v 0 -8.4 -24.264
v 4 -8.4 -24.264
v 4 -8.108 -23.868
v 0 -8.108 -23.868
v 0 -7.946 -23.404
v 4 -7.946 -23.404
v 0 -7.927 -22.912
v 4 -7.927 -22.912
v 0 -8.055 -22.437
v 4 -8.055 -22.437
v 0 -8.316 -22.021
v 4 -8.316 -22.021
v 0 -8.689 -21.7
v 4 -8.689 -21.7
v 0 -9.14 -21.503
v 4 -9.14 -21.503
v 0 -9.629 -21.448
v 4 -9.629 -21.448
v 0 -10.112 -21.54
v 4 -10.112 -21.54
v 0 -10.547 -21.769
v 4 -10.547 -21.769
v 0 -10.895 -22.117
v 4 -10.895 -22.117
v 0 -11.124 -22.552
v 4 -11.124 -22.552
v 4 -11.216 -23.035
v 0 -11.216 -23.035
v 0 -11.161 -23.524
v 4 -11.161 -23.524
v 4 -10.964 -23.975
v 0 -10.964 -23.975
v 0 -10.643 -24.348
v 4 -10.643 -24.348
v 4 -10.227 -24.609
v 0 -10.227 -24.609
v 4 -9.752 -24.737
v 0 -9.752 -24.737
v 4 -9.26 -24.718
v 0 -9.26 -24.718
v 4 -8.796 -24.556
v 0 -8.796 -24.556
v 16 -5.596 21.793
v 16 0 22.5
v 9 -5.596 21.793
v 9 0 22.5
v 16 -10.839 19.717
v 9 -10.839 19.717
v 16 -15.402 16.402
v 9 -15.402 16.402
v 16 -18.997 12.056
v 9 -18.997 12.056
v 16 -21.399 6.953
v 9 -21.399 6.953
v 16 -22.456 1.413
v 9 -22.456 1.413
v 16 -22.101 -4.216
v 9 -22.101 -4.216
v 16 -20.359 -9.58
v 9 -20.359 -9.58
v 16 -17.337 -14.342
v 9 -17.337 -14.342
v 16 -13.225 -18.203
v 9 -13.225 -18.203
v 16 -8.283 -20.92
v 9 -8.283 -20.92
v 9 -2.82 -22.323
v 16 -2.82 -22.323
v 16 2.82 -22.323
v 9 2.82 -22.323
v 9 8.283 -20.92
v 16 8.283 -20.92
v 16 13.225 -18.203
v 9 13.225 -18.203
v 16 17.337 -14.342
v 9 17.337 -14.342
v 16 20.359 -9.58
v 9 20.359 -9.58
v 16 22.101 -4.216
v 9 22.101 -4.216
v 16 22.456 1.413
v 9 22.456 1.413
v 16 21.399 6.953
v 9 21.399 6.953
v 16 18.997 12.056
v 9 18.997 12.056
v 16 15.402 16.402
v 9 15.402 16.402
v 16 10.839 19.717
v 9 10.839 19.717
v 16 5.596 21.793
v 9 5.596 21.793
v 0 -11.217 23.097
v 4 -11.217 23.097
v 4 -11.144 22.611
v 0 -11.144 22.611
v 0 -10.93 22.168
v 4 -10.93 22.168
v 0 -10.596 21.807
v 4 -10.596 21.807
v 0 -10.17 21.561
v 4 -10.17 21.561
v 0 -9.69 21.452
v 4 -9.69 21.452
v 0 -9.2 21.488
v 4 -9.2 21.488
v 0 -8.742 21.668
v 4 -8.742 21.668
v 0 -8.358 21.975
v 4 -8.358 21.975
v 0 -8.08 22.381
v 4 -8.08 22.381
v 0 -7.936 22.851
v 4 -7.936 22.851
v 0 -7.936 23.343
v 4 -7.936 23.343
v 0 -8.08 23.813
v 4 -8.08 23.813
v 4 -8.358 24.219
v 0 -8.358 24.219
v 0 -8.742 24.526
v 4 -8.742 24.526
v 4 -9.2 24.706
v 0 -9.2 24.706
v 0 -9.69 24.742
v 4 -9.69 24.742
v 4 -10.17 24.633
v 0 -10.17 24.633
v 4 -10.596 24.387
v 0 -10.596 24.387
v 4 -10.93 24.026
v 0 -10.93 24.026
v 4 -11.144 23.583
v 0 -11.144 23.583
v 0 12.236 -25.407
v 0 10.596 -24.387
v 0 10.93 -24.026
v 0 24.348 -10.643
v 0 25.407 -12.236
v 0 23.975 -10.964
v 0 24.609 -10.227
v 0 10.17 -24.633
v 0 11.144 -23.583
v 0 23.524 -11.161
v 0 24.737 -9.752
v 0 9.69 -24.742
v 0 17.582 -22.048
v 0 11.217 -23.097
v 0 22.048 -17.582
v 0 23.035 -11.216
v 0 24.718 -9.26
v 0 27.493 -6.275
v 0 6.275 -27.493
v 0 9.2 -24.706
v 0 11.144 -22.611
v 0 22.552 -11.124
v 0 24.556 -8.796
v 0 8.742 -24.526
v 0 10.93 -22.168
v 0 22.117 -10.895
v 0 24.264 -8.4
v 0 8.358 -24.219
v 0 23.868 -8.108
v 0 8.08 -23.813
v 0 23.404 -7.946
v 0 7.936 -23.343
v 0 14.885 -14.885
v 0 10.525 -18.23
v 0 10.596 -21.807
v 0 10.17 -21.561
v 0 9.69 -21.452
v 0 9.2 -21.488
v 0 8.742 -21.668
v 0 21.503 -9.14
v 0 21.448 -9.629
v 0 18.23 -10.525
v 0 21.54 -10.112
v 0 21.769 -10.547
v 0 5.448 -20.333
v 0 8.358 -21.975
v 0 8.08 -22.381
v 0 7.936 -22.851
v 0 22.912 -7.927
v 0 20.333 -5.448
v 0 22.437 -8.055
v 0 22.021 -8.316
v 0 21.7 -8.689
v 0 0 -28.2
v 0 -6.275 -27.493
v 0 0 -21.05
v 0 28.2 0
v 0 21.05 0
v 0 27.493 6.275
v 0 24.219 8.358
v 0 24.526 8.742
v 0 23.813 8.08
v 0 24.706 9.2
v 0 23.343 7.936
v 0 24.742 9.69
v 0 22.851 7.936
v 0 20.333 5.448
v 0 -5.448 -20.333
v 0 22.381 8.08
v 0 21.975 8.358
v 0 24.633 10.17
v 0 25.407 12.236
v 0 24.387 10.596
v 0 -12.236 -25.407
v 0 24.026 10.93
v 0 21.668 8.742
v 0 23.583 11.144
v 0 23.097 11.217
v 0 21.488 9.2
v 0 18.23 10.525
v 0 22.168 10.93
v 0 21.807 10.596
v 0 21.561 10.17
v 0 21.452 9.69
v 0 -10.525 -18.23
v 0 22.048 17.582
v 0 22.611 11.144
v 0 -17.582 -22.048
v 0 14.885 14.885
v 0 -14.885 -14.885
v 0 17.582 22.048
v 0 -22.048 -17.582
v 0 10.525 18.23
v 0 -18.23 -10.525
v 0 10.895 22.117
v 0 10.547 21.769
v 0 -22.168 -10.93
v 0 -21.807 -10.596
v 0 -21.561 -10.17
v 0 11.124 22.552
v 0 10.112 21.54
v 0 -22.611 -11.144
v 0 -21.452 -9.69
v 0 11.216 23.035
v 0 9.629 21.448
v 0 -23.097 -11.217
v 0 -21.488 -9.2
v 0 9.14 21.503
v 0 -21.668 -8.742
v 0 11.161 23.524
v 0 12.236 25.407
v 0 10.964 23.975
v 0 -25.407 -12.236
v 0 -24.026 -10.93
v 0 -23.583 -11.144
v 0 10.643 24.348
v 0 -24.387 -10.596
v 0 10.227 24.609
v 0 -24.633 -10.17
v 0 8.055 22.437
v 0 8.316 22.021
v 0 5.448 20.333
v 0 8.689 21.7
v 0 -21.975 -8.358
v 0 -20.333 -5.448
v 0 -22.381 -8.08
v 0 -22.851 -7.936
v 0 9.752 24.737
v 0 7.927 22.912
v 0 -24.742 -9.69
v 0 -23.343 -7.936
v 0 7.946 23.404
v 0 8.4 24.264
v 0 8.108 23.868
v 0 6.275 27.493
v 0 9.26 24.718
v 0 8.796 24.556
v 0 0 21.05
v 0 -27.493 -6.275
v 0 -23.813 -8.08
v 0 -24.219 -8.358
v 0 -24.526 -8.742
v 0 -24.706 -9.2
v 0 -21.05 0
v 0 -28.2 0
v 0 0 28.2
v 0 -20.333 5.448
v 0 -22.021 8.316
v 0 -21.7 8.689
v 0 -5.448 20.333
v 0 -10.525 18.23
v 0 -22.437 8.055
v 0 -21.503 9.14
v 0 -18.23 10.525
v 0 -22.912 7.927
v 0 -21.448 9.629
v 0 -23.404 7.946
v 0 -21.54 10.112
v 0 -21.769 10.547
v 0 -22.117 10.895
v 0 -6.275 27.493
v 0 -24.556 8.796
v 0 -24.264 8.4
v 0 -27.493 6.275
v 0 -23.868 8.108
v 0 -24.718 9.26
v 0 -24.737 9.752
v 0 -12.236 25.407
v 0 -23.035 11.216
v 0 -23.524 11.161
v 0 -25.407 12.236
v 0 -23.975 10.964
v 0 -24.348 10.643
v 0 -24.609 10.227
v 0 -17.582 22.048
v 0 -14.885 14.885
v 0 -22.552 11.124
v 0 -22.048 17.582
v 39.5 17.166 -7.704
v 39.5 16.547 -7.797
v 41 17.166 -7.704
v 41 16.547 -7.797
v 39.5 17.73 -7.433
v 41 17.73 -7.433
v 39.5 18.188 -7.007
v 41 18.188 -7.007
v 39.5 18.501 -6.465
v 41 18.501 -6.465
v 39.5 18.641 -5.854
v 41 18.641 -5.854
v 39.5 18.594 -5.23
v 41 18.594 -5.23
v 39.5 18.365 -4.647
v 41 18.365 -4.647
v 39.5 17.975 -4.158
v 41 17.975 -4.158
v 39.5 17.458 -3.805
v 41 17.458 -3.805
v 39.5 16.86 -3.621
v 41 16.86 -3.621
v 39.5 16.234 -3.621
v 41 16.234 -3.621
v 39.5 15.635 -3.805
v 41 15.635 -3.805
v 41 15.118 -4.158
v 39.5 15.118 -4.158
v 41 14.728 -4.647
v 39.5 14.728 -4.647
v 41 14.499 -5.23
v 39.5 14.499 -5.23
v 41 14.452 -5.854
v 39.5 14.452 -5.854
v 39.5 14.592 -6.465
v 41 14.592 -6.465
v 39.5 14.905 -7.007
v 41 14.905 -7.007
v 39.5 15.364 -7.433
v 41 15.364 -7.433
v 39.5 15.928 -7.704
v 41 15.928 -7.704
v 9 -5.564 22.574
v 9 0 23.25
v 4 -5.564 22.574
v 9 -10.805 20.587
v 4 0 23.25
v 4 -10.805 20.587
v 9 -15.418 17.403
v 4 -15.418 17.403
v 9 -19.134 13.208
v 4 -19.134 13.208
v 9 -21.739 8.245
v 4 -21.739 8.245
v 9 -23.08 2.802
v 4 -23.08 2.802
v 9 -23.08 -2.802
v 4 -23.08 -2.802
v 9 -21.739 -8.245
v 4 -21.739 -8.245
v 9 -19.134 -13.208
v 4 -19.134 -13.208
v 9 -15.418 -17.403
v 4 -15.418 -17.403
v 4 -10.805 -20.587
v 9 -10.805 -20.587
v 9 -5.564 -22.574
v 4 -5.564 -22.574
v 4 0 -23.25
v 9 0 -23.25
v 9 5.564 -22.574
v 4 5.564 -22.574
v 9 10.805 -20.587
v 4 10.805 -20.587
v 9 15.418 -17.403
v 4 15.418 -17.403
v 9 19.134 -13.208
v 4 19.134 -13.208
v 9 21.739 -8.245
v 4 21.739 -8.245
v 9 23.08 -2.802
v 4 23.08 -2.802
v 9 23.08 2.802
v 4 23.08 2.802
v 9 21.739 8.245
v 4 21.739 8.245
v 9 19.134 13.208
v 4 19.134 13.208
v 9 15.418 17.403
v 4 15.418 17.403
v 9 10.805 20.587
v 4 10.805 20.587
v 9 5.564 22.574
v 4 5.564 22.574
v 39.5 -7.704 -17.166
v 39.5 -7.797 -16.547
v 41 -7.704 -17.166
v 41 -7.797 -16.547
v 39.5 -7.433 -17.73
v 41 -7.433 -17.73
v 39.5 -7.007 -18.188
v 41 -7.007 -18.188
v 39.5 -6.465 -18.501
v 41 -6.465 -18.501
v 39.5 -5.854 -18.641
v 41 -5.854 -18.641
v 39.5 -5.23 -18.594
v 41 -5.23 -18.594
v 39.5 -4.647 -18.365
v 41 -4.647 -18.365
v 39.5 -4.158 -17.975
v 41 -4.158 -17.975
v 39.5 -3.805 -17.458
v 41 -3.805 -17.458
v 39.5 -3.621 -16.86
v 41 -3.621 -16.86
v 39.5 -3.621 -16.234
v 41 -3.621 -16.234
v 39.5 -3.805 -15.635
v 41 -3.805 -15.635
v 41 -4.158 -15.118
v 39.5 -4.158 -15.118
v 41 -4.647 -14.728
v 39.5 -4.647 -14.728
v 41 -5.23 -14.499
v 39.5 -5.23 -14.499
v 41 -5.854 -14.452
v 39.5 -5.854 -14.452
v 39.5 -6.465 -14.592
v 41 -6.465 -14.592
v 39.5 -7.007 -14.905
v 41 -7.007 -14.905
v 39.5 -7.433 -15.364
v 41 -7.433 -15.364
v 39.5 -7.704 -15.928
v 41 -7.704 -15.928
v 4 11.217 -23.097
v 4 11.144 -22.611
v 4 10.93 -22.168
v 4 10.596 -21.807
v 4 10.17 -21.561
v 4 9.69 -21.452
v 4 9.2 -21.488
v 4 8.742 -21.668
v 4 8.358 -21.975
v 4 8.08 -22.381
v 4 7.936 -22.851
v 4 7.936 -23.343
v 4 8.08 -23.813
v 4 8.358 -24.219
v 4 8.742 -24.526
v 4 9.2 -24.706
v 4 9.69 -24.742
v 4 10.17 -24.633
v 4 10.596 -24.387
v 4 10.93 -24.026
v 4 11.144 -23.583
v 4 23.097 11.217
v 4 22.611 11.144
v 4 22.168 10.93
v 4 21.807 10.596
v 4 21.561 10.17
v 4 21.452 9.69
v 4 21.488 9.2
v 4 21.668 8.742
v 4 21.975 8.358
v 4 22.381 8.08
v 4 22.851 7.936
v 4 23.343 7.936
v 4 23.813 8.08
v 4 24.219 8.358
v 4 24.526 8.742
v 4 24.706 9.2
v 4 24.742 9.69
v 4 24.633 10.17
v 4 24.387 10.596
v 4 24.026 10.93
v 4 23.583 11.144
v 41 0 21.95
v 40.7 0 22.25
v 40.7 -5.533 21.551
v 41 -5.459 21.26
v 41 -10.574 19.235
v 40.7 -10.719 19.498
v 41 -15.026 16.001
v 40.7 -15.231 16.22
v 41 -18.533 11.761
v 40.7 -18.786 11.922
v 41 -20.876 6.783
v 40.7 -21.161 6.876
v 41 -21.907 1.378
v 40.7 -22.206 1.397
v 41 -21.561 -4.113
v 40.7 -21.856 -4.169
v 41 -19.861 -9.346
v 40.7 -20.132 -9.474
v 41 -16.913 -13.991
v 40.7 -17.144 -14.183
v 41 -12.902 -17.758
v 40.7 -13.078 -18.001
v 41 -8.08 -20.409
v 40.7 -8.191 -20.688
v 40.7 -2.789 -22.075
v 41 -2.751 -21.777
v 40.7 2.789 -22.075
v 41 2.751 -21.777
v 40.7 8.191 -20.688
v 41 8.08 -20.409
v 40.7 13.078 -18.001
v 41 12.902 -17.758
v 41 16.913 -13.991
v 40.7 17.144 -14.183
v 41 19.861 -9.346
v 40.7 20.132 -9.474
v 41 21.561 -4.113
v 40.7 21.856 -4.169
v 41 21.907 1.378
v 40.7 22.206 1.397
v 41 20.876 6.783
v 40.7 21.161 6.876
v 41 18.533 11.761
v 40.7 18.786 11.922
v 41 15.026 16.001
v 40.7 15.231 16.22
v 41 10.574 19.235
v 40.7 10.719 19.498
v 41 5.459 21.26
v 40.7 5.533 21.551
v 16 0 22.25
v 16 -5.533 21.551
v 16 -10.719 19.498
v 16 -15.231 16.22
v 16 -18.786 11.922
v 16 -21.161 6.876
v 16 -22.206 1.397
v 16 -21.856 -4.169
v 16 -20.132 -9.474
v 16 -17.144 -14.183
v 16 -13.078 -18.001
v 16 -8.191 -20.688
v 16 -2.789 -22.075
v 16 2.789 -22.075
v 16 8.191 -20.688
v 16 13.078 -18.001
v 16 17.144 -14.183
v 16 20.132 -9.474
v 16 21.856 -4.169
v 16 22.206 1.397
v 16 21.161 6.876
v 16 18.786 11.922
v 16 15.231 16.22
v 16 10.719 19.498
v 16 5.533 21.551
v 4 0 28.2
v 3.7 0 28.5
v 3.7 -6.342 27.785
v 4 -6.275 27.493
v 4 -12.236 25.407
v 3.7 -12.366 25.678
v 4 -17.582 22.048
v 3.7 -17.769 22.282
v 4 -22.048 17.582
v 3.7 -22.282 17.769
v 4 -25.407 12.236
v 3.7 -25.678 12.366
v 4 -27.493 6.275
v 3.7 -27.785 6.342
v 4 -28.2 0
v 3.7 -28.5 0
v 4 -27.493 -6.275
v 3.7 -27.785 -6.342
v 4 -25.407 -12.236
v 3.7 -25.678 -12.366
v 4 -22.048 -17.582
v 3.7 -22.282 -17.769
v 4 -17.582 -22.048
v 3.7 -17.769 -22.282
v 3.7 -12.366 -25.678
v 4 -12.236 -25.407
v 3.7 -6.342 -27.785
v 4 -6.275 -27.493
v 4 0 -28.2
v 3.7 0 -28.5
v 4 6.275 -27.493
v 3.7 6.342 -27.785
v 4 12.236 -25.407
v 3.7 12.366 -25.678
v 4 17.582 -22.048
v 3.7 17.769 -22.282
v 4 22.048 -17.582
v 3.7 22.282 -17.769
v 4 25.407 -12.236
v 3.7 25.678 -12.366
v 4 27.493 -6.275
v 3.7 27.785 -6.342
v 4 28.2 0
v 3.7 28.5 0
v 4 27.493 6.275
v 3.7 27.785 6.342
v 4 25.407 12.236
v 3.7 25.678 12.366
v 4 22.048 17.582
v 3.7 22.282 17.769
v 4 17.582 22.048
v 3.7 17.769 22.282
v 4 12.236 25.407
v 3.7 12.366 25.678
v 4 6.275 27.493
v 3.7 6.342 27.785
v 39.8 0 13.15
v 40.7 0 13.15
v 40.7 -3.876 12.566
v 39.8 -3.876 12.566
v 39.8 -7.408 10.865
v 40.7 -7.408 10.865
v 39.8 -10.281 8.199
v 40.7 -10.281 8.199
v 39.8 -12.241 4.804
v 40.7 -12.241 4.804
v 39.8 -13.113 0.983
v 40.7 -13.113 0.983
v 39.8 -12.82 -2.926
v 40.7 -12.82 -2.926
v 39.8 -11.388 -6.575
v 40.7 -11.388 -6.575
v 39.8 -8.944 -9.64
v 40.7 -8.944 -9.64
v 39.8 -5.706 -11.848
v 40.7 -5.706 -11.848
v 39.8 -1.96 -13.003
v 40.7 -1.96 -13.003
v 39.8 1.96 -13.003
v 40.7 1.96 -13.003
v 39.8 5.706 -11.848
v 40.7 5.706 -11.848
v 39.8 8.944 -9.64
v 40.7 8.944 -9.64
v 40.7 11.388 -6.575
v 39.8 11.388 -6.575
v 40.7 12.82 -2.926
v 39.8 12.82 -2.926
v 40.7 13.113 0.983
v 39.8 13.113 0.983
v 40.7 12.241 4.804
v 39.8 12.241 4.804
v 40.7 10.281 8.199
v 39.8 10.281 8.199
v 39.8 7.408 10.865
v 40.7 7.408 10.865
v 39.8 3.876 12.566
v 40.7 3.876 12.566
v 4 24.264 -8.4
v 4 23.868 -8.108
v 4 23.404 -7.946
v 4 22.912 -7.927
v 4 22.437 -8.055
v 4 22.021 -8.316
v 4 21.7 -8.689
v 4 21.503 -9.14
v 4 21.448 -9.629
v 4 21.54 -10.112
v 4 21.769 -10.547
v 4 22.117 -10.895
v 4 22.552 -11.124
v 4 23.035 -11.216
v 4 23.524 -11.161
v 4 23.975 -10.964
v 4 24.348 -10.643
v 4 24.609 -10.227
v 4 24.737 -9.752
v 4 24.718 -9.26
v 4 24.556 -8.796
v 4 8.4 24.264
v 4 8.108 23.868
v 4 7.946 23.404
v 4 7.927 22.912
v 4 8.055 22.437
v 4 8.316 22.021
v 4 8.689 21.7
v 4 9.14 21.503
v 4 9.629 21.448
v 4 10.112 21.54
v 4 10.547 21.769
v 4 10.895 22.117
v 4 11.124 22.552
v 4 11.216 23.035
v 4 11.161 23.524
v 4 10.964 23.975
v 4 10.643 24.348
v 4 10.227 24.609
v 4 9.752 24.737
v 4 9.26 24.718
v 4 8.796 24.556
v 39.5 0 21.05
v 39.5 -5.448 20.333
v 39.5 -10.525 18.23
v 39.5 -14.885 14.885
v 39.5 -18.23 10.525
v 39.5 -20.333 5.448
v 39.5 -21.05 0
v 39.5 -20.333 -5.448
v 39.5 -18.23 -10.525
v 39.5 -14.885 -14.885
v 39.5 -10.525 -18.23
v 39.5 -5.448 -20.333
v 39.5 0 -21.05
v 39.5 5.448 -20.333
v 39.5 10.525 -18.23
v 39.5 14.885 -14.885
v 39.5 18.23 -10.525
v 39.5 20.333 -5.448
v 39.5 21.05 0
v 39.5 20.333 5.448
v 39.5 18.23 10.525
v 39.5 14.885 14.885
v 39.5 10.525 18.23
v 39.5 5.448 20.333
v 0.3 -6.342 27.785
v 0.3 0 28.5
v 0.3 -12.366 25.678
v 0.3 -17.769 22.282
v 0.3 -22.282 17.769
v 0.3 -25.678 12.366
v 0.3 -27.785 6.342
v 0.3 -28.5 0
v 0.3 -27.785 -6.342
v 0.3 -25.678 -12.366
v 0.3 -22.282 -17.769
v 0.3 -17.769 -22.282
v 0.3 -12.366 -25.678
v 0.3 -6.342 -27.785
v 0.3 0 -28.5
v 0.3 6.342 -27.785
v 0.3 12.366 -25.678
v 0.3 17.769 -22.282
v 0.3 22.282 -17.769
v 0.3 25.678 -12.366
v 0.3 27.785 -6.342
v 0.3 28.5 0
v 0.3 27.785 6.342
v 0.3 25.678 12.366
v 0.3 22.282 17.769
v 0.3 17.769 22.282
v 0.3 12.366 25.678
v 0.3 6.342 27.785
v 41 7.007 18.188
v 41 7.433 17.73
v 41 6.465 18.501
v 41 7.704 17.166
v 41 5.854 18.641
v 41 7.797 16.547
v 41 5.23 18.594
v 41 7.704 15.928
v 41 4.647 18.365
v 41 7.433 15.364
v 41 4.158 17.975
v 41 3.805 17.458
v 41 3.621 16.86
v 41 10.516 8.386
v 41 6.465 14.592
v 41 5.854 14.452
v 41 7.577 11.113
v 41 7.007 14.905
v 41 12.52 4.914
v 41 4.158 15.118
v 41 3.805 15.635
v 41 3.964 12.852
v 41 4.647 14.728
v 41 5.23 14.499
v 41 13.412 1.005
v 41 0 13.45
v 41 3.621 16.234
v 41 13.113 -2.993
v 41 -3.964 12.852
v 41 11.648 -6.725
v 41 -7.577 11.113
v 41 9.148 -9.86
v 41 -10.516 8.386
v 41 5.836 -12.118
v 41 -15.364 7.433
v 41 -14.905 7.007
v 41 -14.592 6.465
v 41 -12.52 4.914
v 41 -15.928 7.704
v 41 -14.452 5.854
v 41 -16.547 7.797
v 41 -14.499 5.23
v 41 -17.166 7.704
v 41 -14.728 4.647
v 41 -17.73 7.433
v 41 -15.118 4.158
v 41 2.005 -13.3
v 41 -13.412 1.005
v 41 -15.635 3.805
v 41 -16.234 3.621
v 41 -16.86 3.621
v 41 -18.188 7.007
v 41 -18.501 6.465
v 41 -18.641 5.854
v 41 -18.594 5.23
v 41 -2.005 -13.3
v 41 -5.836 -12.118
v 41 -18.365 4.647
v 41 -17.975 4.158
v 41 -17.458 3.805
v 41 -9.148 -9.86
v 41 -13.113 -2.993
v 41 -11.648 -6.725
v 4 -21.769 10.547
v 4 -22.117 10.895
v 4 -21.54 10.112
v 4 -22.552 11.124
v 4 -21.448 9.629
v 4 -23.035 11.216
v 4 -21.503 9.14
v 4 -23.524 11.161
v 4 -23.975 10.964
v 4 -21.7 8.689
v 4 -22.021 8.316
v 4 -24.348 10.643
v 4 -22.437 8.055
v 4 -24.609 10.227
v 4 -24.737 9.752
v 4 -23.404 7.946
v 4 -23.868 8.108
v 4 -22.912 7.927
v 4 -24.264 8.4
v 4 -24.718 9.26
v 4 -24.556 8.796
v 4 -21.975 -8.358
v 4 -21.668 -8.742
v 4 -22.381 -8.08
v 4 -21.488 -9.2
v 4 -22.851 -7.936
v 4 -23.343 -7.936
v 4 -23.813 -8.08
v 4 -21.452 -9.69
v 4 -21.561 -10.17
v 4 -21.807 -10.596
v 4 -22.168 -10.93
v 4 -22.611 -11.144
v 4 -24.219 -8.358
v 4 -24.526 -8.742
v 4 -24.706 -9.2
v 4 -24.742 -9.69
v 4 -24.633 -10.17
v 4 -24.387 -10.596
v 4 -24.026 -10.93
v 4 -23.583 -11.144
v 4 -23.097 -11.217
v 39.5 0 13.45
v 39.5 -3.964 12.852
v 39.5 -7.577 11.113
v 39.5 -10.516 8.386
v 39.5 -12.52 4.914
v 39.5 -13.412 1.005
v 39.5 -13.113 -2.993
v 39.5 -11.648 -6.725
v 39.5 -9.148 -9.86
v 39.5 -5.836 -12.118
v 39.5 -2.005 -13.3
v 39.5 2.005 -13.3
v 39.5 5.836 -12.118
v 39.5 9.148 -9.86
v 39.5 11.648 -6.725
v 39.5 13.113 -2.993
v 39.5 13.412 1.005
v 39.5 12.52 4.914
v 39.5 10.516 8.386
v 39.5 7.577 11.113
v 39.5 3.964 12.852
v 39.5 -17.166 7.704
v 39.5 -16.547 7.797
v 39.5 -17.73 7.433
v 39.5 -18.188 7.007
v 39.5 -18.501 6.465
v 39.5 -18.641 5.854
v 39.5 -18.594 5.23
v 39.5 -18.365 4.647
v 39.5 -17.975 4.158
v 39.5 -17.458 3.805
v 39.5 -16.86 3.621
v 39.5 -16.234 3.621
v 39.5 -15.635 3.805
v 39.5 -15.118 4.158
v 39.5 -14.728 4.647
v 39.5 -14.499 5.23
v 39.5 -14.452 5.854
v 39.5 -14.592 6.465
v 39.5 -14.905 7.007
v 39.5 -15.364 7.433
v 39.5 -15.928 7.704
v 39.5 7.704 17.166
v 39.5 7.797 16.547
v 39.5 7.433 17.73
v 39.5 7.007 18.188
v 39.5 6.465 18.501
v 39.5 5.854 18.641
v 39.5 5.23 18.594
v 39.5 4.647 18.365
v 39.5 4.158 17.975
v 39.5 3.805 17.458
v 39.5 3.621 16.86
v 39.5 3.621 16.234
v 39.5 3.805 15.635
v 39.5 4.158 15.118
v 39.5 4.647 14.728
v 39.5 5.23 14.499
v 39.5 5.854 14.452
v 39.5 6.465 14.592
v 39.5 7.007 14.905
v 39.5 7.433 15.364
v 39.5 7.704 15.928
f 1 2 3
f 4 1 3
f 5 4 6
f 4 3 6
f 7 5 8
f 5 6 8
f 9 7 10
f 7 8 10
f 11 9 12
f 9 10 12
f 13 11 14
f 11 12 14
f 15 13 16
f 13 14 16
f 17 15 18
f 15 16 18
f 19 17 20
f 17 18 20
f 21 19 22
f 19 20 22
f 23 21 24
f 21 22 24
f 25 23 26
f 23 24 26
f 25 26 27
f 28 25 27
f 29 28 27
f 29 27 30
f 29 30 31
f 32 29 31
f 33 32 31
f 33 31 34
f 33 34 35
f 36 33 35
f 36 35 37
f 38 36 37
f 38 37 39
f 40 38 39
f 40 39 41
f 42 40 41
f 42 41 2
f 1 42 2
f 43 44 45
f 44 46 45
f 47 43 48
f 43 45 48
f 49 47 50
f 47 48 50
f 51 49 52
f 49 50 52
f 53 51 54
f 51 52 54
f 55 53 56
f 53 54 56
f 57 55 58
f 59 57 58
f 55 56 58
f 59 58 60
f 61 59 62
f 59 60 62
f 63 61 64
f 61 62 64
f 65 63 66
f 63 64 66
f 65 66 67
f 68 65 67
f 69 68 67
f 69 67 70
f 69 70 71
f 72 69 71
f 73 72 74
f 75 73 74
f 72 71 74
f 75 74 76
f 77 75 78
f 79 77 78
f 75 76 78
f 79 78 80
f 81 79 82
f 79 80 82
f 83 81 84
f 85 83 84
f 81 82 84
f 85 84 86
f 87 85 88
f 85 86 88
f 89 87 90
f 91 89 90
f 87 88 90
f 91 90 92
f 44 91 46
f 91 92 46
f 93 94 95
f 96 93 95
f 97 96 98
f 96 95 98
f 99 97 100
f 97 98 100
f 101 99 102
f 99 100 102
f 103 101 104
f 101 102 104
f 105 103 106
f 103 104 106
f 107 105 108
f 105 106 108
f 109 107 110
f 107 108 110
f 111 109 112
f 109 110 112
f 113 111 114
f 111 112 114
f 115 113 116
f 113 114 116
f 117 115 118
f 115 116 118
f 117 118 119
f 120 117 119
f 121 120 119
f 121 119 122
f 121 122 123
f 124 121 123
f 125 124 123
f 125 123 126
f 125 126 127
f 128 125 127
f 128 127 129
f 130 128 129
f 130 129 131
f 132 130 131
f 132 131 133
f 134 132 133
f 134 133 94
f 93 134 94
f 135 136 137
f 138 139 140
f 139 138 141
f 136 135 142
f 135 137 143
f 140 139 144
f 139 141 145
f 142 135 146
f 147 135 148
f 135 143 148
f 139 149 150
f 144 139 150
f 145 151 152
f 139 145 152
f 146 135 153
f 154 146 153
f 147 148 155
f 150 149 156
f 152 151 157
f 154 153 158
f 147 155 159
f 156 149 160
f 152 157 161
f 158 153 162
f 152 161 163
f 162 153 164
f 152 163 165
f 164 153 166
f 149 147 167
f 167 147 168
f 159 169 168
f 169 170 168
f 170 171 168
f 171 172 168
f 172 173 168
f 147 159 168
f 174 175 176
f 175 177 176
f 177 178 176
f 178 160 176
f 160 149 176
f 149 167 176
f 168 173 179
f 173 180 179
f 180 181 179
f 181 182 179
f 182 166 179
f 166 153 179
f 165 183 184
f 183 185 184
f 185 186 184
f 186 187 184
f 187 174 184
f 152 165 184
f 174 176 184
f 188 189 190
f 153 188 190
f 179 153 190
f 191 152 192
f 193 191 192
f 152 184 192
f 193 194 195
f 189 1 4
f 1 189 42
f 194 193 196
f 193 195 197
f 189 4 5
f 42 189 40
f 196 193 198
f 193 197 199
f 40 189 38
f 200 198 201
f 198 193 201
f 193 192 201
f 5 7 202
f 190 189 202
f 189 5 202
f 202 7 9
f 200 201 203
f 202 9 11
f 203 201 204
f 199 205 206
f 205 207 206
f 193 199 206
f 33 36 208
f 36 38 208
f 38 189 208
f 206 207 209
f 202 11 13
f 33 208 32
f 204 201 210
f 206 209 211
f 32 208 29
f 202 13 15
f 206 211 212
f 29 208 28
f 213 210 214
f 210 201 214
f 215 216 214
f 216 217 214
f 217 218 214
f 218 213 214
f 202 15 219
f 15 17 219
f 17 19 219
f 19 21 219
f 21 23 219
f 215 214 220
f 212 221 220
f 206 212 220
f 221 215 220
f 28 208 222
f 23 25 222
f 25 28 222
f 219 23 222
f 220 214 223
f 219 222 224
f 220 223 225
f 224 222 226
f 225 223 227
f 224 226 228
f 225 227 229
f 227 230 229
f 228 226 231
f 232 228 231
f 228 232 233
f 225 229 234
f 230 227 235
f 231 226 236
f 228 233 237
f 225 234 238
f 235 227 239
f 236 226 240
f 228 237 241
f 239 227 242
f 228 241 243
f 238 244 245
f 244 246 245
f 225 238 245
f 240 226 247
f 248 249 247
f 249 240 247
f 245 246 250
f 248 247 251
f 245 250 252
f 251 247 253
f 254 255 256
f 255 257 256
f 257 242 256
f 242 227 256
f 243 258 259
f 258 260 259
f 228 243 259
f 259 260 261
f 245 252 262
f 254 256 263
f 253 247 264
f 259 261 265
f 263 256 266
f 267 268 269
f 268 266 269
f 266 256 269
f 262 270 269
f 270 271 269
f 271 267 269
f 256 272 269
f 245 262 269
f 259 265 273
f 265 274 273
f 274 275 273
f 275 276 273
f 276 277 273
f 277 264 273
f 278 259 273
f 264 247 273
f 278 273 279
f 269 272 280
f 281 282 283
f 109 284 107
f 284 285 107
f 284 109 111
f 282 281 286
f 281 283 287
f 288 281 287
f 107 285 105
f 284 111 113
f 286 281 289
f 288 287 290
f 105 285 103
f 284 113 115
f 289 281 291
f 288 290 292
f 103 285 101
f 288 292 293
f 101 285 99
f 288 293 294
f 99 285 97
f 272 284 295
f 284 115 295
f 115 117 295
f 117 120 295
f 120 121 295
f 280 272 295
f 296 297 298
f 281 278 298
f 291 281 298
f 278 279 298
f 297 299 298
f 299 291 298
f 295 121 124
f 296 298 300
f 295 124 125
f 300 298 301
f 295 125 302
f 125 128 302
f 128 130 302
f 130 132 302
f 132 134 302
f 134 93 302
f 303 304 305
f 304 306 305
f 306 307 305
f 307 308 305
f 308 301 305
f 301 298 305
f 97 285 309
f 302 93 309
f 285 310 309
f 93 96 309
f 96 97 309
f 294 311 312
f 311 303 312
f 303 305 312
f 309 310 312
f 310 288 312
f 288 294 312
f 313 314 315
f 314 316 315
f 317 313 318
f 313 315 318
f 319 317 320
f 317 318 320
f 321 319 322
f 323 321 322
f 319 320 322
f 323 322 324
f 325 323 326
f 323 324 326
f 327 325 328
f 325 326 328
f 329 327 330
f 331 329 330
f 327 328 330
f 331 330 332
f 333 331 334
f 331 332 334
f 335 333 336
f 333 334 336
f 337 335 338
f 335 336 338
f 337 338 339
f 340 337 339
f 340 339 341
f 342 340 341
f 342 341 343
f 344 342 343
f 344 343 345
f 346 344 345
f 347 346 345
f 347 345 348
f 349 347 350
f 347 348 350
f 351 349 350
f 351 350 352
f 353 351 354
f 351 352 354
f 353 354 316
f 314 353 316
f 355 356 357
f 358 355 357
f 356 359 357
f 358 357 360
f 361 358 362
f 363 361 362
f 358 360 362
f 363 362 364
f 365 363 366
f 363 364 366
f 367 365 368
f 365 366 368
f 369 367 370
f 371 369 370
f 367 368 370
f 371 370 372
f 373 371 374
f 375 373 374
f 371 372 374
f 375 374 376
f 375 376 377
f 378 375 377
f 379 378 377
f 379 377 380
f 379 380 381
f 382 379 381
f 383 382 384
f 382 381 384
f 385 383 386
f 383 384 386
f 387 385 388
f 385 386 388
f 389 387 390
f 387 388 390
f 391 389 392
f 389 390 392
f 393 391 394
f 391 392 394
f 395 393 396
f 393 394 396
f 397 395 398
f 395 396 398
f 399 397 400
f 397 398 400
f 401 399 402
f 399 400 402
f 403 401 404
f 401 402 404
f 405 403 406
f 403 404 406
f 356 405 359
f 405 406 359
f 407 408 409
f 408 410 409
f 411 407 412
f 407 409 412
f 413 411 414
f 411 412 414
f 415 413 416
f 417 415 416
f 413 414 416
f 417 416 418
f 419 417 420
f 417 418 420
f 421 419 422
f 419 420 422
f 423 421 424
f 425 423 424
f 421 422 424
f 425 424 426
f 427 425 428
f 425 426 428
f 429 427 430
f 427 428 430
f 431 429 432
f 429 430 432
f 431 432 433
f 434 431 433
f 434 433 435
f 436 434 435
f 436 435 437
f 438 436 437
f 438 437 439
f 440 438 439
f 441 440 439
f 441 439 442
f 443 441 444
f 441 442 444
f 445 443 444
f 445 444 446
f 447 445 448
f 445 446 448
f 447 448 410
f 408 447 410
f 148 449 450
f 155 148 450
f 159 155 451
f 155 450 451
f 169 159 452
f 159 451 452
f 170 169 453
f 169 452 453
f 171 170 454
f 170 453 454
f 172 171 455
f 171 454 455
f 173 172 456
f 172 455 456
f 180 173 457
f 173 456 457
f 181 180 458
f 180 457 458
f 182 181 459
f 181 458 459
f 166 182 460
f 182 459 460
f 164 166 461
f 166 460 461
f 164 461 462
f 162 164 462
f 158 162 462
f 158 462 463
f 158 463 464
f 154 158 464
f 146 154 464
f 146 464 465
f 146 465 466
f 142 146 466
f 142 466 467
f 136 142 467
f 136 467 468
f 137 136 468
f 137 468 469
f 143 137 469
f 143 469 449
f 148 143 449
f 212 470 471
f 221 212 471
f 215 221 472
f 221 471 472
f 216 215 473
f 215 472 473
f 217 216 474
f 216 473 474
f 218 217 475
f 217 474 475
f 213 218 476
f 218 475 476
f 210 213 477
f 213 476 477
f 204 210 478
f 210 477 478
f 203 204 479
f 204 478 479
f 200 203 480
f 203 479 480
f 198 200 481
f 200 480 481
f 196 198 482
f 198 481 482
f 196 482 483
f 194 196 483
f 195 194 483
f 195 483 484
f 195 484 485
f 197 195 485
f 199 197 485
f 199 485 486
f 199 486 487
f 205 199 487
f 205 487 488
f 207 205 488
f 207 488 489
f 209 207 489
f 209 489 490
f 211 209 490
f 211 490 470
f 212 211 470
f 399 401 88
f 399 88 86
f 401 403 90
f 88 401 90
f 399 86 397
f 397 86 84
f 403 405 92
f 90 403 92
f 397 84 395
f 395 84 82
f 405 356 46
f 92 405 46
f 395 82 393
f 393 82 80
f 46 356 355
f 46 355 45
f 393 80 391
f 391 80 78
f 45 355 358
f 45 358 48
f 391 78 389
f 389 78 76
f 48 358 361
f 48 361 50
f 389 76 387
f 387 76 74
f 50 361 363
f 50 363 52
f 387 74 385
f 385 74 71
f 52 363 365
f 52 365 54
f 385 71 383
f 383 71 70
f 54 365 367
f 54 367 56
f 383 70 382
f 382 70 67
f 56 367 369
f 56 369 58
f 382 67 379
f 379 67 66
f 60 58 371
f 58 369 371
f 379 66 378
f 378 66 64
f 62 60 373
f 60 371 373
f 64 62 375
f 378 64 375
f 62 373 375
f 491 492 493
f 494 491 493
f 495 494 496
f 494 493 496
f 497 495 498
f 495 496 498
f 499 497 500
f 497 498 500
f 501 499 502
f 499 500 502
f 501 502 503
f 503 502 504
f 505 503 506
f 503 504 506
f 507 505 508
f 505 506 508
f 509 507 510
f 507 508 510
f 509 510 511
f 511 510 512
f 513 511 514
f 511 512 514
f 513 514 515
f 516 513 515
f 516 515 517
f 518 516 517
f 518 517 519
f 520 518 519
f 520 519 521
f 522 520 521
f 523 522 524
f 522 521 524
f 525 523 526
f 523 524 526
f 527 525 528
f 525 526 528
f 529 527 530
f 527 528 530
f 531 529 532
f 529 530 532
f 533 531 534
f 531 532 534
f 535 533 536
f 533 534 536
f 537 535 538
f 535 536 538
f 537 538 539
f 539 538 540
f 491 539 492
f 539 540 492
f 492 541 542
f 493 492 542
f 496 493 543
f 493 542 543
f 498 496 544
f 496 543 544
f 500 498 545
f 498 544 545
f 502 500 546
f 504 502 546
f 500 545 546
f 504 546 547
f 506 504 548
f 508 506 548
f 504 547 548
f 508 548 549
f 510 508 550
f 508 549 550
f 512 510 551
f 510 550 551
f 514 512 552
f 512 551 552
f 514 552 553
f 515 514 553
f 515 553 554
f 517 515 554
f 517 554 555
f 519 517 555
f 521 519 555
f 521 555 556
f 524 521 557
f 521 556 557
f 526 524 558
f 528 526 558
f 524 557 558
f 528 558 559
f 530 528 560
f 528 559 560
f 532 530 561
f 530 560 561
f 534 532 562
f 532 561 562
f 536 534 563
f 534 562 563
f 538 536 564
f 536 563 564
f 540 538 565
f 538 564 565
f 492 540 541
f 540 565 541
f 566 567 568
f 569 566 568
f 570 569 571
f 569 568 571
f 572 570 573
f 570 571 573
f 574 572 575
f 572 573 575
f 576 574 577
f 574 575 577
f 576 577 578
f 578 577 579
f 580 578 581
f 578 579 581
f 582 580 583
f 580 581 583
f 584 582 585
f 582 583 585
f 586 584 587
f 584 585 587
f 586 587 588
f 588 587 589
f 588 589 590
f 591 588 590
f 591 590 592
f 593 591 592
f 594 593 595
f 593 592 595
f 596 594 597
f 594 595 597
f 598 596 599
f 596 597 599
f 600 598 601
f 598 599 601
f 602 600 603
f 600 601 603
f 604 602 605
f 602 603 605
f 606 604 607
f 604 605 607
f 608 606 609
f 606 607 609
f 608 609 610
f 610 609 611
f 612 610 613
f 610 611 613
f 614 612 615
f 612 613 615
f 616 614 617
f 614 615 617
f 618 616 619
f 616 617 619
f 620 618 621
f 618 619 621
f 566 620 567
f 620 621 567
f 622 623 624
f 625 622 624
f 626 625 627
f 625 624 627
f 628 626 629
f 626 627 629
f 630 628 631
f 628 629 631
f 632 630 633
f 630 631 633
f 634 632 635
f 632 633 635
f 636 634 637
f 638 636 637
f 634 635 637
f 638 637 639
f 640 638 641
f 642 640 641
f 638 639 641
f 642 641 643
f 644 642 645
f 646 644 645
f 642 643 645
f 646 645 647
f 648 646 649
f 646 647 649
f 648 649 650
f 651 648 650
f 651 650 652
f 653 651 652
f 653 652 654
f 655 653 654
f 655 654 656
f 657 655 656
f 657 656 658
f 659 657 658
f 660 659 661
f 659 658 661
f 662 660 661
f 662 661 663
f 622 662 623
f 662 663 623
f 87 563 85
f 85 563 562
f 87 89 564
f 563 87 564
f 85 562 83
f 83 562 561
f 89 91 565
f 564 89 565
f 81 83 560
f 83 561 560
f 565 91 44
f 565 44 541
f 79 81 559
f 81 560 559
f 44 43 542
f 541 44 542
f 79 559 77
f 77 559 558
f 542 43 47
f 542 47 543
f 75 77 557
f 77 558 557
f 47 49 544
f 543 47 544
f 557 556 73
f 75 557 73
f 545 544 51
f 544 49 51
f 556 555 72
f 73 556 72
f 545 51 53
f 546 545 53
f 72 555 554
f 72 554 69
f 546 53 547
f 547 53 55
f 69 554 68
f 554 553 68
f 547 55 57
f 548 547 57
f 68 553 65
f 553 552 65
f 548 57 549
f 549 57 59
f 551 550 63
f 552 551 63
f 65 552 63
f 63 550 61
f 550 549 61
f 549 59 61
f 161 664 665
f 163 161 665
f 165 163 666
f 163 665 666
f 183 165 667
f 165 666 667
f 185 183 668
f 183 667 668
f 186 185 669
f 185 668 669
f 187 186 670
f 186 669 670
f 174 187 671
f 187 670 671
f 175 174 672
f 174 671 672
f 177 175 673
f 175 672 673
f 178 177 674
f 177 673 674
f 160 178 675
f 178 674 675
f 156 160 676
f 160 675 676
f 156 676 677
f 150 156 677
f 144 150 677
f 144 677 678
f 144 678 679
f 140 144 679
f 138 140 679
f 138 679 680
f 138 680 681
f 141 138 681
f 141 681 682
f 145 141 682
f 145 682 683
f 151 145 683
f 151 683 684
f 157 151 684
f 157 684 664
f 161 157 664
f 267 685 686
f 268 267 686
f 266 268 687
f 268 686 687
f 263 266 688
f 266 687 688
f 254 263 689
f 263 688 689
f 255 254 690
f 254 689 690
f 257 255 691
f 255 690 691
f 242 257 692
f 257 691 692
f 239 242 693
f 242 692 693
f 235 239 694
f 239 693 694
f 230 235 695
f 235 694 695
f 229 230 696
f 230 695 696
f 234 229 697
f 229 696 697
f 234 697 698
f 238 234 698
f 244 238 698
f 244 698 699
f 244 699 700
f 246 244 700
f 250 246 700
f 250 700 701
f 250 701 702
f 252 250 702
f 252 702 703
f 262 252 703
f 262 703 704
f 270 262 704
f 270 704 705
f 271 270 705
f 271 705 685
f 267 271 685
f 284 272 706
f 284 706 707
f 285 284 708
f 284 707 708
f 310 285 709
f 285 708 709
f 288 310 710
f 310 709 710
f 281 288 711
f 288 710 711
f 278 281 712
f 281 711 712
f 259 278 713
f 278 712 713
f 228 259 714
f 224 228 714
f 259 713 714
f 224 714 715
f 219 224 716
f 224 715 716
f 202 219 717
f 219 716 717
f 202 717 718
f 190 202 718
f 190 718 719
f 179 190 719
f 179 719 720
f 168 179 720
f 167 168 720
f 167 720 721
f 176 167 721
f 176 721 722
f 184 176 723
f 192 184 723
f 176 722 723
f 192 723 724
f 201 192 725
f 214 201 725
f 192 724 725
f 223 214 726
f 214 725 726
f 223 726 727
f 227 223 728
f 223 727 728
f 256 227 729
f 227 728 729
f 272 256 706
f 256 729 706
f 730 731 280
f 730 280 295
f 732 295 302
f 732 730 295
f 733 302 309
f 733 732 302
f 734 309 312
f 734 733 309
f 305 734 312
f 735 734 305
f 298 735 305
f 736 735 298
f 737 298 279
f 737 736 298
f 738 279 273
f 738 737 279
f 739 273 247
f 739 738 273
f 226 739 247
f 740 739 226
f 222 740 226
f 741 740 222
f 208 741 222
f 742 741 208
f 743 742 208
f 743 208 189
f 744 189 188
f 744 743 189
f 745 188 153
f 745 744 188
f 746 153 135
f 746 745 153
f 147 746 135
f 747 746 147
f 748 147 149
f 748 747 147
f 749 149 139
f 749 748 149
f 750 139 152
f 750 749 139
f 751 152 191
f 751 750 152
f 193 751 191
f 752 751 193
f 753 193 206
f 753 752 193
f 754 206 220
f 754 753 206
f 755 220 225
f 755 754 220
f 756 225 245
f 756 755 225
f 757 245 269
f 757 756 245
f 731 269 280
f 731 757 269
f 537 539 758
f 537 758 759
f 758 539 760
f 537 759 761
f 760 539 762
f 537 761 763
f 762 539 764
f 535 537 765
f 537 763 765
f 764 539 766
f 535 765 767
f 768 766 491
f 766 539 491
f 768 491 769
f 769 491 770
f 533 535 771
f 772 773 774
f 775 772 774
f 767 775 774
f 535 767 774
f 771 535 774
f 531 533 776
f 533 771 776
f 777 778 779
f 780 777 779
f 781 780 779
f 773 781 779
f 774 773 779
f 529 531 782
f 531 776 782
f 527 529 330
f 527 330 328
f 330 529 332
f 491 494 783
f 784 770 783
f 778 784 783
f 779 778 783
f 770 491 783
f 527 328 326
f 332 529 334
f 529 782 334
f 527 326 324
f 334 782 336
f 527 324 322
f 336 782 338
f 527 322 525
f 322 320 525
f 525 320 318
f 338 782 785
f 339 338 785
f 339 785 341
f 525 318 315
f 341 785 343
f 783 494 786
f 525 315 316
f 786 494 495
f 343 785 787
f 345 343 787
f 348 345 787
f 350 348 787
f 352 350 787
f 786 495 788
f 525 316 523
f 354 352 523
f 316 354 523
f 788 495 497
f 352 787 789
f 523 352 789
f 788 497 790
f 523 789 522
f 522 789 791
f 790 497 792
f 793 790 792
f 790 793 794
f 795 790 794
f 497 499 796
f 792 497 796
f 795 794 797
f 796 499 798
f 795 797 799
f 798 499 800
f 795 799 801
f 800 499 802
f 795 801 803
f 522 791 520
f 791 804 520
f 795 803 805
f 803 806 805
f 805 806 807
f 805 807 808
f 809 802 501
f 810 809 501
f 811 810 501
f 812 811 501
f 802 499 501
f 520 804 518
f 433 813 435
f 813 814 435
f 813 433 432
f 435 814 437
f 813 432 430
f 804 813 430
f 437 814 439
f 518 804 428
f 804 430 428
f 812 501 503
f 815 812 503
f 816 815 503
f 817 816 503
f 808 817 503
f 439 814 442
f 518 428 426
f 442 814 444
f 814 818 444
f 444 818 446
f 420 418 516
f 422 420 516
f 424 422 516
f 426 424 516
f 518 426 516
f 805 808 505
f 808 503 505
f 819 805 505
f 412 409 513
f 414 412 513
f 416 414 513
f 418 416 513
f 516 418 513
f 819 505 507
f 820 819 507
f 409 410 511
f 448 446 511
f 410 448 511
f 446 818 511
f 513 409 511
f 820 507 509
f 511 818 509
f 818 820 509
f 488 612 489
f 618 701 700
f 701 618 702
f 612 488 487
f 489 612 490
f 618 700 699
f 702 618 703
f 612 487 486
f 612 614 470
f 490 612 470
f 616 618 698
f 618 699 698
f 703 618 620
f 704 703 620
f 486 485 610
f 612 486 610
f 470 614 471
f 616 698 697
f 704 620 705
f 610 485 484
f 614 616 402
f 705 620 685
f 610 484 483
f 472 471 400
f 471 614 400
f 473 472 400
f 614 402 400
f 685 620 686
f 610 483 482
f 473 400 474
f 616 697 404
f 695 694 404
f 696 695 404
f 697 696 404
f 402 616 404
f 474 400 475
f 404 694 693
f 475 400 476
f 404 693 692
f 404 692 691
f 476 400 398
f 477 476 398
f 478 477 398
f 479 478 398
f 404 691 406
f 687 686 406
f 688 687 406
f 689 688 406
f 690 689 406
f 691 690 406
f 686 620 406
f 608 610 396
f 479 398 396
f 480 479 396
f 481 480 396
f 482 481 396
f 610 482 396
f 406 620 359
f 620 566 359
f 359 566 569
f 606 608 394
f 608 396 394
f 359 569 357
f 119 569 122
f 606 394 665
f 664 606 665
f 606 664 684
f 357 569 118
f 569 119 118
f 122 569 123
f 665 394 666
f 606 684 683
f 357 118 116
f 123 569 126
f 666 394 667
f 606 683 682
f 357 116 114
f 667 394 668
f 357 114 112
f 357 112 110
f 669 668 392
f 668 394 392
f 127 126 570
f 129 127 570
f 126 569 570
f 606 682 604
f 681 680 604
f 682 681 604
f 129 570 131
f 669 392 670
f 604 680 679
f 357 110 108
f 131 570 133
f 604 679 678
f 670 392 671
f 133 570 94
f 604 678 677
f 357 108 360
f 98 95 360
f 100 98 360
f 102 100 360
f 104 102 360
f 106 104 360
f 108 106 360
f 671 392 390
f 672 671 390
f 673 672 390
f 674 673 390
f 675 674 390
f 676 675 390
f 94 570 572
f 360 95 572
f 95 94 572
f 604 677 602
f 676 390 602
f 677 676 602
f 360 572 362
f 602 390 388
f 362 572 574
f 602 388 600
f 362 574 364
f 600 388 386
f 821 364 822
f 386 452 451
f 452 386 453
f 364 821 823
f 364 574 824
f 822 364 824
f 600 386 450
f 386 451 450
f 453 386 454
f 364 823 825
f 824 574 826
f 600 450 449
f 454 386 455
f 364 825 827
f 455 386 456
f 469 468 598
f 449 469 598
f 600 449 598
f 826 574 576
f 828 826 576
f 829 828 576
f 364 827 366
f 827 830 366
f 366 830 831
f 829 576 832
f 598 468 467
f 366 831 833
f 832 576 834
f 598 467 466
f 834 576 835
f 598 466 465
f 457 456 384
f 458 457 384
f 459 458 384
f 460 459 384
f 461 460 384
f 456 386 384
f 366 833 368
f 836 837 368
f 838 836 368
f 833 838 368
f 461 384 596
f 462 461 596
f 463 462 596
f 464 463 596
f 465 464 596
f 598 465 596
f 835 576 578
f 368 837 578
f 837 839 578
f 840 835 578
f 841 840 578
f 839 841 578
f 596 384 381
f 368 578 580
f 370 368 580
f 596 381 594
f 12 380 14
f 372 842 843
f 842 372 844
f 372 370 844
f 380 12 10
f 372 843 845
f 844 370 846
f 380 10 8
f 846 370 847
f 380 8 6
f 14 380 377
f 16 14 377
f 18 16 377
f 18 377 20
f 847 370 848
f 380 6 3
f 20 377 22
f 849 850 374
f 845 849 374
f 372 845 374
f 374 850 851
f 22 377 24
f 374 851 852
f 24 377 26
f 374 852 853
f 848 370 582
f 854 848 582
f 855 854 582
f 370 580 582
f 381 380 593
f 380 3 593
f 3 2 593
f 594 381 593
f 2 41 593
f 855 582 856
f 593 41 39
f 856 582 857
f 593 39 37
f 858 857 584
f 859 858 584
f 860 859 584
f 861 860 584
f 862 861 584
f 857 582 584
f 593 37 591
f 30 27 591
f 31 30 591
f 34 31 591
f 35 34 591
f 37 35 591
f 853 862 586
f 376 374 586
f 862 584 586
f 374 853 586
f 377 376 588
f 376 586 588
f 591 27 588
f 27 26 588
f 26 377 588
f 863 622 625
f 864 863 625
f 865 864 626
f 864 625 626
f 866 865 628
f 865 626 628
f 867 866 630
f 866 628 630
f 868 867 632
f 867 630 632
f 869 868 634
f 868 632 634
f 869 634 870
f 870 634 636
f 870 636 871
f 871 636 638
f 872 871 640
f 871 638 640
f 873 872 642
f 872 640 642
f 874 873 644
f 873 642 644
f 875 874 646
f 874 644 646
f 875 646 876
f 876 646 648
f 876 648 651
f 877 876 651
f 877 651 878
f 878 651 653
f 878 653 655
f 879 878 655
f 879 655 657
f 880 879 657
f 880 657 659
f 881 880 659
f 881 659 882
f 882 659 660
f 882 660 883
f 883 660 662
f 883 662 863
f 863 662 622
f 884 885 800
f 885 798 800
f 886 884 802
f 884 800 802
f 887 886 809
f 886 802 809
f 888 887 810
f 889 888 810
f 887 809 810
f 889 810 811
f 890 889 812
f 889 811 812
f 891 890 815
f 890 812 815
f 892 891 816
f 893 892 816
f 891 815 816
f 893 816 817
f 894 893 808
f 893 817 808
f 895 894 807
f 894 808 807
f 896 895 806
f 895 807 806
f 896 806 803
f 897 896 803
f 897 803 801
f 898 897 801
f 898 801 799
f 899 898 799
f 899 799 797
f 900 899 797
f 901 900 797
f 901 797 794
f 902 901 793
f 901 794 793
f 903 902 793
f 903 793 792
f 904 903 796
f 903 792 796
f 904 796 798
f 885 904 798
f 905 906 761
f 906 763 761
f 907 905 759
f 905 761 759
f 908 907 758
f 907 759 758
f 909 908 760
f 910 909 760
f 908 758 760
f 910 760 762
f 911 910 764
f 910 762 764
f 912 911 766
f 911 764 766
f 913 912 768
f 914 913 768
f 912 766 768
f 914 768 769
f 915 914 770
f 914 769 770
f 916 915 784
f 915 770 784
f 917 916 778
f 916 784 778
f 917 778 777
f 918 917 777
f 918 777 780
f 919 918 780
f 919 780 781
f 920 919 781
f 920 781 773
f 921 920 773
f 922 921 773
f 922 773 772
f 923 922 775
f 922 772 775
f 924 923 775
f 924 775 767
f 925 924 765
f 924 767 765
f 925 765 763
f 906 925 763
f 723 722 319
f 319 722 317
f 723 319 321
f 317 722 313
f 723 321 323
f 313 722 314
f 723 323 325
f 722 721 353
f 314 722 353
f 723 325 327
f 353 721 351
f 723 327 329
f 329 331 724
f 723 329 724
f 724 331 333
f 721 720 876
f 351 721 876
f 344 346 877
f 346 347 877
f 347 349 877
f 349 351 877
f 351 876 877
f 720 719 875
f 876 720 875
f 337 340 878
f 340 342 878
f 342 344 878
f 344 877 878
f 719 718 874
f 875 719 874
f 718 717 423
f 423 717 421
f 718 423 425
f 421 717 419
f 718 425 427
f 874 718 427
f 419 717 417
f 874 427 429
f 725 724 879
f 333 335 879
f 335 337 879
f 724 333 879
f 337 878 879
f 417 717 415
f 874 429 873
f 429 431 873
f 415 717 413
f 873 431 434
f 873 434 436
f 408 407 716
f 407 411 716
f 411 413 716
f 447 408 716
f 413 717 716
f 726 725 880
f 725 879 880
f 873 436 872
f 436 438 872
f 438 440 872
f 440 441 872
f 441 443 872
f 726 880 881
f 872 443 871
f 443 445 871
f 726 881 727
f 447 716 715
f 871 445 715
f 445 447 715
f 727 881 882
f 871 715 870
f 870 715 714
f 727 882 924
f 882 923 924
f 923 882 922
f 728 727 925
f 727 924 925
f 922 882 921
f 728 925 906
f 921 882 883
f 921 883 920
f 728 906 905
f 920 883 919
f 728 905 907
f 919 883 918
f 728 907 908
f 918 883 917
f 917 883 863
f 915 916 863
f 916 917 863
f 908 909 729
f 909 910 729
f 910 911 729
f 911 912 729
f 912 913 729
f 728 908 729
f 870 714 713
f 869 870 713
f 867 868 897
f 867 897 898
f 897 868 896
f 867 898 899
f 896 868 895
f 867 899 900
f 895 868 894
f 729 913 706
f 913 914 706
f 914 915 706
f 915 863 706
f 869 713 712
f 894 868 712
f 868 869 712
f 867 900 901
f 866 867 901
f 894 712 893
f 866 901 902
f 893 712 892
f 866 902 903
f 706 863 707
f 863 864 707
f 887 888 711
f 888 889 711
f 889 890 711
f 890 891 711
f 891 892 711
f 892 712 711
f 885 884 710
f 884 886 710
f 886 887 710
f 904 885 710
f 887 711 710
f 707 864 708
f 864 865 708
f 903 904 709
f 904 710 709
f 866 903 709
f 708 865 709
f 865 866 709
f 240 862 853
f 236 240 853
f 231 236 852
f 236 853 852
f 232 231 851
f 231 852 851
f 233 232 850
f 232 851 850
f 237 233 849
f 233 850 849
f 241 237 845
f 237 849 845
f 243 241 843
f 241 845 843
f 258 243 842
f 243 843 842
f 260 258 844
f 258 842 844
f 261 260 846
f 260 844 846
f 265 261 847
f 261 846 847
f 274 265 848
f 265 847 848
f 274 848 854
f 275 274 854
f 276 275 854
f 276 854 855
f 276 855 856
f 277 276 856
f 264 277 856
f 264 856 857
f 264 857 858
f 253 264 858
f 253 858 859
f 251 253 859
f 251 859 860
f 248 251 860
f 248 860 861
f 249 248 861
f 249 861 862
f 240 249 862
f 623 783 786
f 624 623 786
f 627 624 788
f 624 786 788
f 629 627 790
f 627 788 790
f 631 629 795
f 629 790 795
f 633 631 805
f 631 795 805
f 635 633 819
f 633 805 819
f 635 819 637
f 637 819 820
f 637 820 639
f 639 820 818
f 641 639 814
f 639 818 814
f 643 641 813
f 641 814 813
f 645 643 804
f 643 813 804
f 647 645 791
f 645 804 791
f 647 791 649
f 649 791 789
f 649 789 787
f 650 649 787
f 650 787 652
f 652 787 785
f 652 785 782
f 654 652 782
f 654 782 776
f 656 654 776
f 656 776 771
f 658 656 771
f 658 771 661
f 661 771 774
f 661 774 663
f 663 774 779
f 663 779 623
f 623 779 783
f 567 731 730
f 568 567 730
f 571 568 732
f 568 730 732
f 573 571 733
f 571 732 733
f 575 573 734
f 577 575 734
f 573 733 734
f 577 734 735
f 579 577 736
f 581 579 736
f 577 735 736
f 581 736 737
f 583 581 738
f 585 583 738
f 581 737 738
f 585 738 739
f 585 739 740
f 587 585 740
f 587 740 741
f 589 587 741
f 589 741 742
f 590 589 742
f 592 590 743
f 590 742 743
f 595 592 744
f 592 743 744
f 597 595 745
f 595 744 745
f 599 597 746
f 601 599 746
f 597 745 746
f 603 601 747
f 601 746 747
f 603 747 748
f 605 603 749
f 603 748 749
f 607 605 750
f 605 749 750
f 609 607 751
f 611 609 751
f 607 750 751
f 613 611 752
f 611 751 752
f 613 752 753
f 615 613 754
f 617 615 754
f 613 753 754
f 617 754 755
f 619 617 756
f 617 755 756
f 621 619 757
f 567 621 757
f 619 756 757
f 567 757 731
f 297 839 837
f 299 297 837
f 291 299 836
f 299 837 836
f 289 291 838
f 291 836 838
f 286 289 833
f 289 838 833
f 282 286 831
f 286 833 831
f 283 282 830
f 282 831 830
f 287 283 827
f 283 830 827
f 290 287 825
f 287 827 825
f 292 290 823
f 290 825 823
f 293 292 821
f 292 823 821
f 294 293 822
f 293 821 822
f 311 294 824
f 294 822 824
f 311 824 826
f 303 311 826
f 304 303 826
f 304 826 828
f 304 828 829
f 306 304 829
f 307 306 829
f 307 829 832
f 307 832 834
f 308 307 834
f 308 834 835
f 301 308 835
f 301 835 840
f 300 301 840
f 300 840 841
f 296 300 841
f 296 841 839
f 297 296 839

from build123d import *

# Parameters (mm, degrees)
CHAMFER_1_SIZE           = 0.3
SKETCH_2_R               = 2.1
CUT_EXTRUDE_1_DEPTH      = 58.493477891
PATTERN_CIRCULAR_1_COUNT = 4
HOLE_WIZARD_M4_1_D       = 3.3
PATTERN_CIRCULAR_2_COUNT = 8


with BuildPart() as part:
    # 草图1 → 旋转1 (revolve)
    with BuildSketch(Plane.XY, mode=Mode.PRIVATE) as revolve_1_sk:
        Polygon((0, 28.5), (0, 21.05), (39.5, 21.05), (39.5, 13.15), (41, 13.15), (41, 22.25), (16, 22.25), (16, 22.5), (9, 22.5), (9, 23.25), (4, 23.25), (4, 28.5), align=None)
    revolve(revolve_1_sk.sketch.rotate(Axis((0, 0, 0), (1, 0, 0)), 90), axis=Axis((0, 0, 0), (1, 0, 0)))

    # 倒角1
    chamfer_1_edges = [part.edges().sort_by_distance(p)[0] for p in [
        (41, 0, -13.15),
        (41, 0, -22.25),
        (4, 0, -28.5),
        (0, 0, -28.5),
        (39.5, 0, -13.15),
    ]]
    chamfer(chamfer_1_edges, length=CHAMFER_1_SIZE)

    # 草图2 → 切除-拉伸1 (cut, symmetric)
    with BuildSketch(Plane(origin=(41, 0, 0), x_dir=(0, 0, -1), z_dir=(1, 0, 0))):
        with Locations((5.697442703, 16.546575073)):
            Circle(SKETCH_2_R)
    cut_extrude_1 = extrude(amount=CUT_EXTRUDE_1_DEPTH, both=True, mode=Mode.SUBTRACT)

    # 阵列(圆周)1: 切除-拉伸1 ×4 about axis
    pattern_circular_1_axis = Axis((0, 0, 0), (1, 0, 0))
    for i in range(1, PATTERN_CIRCULAR_1_COUNT):
        add(cut_extrude_1.rotate(pattern_circular_1_axis, i * 360 / PATTERN_CIRCULAR_1_COUNT), mode=Mode.SUBTRACT)

    # M4 螺纹孔1 (through all)
    with Locations(Plane.ZY):
        with Locations((-9.567085809, -23.096988313)):
            hole_wizard_m4_1 = Hole(HOLE_WIZARD_M4_1_D / 2)

    # 阵列(圆周)2: M4 螺纹孔1 ×8 about axis
    pattern_circular_2_axis = Axis((0, 0, 0), (1, 0, 0))
    for i in range(1, PATTERN_CIRCULAR_2_COUNT):
        add(hole_wizard_m4_1.rotate(pattern_circular_2_axis, i * 360 / PATTERN_CIRCULAR_2_COUNT), mode=Mode.SUBTRACT)


solid = part.part
